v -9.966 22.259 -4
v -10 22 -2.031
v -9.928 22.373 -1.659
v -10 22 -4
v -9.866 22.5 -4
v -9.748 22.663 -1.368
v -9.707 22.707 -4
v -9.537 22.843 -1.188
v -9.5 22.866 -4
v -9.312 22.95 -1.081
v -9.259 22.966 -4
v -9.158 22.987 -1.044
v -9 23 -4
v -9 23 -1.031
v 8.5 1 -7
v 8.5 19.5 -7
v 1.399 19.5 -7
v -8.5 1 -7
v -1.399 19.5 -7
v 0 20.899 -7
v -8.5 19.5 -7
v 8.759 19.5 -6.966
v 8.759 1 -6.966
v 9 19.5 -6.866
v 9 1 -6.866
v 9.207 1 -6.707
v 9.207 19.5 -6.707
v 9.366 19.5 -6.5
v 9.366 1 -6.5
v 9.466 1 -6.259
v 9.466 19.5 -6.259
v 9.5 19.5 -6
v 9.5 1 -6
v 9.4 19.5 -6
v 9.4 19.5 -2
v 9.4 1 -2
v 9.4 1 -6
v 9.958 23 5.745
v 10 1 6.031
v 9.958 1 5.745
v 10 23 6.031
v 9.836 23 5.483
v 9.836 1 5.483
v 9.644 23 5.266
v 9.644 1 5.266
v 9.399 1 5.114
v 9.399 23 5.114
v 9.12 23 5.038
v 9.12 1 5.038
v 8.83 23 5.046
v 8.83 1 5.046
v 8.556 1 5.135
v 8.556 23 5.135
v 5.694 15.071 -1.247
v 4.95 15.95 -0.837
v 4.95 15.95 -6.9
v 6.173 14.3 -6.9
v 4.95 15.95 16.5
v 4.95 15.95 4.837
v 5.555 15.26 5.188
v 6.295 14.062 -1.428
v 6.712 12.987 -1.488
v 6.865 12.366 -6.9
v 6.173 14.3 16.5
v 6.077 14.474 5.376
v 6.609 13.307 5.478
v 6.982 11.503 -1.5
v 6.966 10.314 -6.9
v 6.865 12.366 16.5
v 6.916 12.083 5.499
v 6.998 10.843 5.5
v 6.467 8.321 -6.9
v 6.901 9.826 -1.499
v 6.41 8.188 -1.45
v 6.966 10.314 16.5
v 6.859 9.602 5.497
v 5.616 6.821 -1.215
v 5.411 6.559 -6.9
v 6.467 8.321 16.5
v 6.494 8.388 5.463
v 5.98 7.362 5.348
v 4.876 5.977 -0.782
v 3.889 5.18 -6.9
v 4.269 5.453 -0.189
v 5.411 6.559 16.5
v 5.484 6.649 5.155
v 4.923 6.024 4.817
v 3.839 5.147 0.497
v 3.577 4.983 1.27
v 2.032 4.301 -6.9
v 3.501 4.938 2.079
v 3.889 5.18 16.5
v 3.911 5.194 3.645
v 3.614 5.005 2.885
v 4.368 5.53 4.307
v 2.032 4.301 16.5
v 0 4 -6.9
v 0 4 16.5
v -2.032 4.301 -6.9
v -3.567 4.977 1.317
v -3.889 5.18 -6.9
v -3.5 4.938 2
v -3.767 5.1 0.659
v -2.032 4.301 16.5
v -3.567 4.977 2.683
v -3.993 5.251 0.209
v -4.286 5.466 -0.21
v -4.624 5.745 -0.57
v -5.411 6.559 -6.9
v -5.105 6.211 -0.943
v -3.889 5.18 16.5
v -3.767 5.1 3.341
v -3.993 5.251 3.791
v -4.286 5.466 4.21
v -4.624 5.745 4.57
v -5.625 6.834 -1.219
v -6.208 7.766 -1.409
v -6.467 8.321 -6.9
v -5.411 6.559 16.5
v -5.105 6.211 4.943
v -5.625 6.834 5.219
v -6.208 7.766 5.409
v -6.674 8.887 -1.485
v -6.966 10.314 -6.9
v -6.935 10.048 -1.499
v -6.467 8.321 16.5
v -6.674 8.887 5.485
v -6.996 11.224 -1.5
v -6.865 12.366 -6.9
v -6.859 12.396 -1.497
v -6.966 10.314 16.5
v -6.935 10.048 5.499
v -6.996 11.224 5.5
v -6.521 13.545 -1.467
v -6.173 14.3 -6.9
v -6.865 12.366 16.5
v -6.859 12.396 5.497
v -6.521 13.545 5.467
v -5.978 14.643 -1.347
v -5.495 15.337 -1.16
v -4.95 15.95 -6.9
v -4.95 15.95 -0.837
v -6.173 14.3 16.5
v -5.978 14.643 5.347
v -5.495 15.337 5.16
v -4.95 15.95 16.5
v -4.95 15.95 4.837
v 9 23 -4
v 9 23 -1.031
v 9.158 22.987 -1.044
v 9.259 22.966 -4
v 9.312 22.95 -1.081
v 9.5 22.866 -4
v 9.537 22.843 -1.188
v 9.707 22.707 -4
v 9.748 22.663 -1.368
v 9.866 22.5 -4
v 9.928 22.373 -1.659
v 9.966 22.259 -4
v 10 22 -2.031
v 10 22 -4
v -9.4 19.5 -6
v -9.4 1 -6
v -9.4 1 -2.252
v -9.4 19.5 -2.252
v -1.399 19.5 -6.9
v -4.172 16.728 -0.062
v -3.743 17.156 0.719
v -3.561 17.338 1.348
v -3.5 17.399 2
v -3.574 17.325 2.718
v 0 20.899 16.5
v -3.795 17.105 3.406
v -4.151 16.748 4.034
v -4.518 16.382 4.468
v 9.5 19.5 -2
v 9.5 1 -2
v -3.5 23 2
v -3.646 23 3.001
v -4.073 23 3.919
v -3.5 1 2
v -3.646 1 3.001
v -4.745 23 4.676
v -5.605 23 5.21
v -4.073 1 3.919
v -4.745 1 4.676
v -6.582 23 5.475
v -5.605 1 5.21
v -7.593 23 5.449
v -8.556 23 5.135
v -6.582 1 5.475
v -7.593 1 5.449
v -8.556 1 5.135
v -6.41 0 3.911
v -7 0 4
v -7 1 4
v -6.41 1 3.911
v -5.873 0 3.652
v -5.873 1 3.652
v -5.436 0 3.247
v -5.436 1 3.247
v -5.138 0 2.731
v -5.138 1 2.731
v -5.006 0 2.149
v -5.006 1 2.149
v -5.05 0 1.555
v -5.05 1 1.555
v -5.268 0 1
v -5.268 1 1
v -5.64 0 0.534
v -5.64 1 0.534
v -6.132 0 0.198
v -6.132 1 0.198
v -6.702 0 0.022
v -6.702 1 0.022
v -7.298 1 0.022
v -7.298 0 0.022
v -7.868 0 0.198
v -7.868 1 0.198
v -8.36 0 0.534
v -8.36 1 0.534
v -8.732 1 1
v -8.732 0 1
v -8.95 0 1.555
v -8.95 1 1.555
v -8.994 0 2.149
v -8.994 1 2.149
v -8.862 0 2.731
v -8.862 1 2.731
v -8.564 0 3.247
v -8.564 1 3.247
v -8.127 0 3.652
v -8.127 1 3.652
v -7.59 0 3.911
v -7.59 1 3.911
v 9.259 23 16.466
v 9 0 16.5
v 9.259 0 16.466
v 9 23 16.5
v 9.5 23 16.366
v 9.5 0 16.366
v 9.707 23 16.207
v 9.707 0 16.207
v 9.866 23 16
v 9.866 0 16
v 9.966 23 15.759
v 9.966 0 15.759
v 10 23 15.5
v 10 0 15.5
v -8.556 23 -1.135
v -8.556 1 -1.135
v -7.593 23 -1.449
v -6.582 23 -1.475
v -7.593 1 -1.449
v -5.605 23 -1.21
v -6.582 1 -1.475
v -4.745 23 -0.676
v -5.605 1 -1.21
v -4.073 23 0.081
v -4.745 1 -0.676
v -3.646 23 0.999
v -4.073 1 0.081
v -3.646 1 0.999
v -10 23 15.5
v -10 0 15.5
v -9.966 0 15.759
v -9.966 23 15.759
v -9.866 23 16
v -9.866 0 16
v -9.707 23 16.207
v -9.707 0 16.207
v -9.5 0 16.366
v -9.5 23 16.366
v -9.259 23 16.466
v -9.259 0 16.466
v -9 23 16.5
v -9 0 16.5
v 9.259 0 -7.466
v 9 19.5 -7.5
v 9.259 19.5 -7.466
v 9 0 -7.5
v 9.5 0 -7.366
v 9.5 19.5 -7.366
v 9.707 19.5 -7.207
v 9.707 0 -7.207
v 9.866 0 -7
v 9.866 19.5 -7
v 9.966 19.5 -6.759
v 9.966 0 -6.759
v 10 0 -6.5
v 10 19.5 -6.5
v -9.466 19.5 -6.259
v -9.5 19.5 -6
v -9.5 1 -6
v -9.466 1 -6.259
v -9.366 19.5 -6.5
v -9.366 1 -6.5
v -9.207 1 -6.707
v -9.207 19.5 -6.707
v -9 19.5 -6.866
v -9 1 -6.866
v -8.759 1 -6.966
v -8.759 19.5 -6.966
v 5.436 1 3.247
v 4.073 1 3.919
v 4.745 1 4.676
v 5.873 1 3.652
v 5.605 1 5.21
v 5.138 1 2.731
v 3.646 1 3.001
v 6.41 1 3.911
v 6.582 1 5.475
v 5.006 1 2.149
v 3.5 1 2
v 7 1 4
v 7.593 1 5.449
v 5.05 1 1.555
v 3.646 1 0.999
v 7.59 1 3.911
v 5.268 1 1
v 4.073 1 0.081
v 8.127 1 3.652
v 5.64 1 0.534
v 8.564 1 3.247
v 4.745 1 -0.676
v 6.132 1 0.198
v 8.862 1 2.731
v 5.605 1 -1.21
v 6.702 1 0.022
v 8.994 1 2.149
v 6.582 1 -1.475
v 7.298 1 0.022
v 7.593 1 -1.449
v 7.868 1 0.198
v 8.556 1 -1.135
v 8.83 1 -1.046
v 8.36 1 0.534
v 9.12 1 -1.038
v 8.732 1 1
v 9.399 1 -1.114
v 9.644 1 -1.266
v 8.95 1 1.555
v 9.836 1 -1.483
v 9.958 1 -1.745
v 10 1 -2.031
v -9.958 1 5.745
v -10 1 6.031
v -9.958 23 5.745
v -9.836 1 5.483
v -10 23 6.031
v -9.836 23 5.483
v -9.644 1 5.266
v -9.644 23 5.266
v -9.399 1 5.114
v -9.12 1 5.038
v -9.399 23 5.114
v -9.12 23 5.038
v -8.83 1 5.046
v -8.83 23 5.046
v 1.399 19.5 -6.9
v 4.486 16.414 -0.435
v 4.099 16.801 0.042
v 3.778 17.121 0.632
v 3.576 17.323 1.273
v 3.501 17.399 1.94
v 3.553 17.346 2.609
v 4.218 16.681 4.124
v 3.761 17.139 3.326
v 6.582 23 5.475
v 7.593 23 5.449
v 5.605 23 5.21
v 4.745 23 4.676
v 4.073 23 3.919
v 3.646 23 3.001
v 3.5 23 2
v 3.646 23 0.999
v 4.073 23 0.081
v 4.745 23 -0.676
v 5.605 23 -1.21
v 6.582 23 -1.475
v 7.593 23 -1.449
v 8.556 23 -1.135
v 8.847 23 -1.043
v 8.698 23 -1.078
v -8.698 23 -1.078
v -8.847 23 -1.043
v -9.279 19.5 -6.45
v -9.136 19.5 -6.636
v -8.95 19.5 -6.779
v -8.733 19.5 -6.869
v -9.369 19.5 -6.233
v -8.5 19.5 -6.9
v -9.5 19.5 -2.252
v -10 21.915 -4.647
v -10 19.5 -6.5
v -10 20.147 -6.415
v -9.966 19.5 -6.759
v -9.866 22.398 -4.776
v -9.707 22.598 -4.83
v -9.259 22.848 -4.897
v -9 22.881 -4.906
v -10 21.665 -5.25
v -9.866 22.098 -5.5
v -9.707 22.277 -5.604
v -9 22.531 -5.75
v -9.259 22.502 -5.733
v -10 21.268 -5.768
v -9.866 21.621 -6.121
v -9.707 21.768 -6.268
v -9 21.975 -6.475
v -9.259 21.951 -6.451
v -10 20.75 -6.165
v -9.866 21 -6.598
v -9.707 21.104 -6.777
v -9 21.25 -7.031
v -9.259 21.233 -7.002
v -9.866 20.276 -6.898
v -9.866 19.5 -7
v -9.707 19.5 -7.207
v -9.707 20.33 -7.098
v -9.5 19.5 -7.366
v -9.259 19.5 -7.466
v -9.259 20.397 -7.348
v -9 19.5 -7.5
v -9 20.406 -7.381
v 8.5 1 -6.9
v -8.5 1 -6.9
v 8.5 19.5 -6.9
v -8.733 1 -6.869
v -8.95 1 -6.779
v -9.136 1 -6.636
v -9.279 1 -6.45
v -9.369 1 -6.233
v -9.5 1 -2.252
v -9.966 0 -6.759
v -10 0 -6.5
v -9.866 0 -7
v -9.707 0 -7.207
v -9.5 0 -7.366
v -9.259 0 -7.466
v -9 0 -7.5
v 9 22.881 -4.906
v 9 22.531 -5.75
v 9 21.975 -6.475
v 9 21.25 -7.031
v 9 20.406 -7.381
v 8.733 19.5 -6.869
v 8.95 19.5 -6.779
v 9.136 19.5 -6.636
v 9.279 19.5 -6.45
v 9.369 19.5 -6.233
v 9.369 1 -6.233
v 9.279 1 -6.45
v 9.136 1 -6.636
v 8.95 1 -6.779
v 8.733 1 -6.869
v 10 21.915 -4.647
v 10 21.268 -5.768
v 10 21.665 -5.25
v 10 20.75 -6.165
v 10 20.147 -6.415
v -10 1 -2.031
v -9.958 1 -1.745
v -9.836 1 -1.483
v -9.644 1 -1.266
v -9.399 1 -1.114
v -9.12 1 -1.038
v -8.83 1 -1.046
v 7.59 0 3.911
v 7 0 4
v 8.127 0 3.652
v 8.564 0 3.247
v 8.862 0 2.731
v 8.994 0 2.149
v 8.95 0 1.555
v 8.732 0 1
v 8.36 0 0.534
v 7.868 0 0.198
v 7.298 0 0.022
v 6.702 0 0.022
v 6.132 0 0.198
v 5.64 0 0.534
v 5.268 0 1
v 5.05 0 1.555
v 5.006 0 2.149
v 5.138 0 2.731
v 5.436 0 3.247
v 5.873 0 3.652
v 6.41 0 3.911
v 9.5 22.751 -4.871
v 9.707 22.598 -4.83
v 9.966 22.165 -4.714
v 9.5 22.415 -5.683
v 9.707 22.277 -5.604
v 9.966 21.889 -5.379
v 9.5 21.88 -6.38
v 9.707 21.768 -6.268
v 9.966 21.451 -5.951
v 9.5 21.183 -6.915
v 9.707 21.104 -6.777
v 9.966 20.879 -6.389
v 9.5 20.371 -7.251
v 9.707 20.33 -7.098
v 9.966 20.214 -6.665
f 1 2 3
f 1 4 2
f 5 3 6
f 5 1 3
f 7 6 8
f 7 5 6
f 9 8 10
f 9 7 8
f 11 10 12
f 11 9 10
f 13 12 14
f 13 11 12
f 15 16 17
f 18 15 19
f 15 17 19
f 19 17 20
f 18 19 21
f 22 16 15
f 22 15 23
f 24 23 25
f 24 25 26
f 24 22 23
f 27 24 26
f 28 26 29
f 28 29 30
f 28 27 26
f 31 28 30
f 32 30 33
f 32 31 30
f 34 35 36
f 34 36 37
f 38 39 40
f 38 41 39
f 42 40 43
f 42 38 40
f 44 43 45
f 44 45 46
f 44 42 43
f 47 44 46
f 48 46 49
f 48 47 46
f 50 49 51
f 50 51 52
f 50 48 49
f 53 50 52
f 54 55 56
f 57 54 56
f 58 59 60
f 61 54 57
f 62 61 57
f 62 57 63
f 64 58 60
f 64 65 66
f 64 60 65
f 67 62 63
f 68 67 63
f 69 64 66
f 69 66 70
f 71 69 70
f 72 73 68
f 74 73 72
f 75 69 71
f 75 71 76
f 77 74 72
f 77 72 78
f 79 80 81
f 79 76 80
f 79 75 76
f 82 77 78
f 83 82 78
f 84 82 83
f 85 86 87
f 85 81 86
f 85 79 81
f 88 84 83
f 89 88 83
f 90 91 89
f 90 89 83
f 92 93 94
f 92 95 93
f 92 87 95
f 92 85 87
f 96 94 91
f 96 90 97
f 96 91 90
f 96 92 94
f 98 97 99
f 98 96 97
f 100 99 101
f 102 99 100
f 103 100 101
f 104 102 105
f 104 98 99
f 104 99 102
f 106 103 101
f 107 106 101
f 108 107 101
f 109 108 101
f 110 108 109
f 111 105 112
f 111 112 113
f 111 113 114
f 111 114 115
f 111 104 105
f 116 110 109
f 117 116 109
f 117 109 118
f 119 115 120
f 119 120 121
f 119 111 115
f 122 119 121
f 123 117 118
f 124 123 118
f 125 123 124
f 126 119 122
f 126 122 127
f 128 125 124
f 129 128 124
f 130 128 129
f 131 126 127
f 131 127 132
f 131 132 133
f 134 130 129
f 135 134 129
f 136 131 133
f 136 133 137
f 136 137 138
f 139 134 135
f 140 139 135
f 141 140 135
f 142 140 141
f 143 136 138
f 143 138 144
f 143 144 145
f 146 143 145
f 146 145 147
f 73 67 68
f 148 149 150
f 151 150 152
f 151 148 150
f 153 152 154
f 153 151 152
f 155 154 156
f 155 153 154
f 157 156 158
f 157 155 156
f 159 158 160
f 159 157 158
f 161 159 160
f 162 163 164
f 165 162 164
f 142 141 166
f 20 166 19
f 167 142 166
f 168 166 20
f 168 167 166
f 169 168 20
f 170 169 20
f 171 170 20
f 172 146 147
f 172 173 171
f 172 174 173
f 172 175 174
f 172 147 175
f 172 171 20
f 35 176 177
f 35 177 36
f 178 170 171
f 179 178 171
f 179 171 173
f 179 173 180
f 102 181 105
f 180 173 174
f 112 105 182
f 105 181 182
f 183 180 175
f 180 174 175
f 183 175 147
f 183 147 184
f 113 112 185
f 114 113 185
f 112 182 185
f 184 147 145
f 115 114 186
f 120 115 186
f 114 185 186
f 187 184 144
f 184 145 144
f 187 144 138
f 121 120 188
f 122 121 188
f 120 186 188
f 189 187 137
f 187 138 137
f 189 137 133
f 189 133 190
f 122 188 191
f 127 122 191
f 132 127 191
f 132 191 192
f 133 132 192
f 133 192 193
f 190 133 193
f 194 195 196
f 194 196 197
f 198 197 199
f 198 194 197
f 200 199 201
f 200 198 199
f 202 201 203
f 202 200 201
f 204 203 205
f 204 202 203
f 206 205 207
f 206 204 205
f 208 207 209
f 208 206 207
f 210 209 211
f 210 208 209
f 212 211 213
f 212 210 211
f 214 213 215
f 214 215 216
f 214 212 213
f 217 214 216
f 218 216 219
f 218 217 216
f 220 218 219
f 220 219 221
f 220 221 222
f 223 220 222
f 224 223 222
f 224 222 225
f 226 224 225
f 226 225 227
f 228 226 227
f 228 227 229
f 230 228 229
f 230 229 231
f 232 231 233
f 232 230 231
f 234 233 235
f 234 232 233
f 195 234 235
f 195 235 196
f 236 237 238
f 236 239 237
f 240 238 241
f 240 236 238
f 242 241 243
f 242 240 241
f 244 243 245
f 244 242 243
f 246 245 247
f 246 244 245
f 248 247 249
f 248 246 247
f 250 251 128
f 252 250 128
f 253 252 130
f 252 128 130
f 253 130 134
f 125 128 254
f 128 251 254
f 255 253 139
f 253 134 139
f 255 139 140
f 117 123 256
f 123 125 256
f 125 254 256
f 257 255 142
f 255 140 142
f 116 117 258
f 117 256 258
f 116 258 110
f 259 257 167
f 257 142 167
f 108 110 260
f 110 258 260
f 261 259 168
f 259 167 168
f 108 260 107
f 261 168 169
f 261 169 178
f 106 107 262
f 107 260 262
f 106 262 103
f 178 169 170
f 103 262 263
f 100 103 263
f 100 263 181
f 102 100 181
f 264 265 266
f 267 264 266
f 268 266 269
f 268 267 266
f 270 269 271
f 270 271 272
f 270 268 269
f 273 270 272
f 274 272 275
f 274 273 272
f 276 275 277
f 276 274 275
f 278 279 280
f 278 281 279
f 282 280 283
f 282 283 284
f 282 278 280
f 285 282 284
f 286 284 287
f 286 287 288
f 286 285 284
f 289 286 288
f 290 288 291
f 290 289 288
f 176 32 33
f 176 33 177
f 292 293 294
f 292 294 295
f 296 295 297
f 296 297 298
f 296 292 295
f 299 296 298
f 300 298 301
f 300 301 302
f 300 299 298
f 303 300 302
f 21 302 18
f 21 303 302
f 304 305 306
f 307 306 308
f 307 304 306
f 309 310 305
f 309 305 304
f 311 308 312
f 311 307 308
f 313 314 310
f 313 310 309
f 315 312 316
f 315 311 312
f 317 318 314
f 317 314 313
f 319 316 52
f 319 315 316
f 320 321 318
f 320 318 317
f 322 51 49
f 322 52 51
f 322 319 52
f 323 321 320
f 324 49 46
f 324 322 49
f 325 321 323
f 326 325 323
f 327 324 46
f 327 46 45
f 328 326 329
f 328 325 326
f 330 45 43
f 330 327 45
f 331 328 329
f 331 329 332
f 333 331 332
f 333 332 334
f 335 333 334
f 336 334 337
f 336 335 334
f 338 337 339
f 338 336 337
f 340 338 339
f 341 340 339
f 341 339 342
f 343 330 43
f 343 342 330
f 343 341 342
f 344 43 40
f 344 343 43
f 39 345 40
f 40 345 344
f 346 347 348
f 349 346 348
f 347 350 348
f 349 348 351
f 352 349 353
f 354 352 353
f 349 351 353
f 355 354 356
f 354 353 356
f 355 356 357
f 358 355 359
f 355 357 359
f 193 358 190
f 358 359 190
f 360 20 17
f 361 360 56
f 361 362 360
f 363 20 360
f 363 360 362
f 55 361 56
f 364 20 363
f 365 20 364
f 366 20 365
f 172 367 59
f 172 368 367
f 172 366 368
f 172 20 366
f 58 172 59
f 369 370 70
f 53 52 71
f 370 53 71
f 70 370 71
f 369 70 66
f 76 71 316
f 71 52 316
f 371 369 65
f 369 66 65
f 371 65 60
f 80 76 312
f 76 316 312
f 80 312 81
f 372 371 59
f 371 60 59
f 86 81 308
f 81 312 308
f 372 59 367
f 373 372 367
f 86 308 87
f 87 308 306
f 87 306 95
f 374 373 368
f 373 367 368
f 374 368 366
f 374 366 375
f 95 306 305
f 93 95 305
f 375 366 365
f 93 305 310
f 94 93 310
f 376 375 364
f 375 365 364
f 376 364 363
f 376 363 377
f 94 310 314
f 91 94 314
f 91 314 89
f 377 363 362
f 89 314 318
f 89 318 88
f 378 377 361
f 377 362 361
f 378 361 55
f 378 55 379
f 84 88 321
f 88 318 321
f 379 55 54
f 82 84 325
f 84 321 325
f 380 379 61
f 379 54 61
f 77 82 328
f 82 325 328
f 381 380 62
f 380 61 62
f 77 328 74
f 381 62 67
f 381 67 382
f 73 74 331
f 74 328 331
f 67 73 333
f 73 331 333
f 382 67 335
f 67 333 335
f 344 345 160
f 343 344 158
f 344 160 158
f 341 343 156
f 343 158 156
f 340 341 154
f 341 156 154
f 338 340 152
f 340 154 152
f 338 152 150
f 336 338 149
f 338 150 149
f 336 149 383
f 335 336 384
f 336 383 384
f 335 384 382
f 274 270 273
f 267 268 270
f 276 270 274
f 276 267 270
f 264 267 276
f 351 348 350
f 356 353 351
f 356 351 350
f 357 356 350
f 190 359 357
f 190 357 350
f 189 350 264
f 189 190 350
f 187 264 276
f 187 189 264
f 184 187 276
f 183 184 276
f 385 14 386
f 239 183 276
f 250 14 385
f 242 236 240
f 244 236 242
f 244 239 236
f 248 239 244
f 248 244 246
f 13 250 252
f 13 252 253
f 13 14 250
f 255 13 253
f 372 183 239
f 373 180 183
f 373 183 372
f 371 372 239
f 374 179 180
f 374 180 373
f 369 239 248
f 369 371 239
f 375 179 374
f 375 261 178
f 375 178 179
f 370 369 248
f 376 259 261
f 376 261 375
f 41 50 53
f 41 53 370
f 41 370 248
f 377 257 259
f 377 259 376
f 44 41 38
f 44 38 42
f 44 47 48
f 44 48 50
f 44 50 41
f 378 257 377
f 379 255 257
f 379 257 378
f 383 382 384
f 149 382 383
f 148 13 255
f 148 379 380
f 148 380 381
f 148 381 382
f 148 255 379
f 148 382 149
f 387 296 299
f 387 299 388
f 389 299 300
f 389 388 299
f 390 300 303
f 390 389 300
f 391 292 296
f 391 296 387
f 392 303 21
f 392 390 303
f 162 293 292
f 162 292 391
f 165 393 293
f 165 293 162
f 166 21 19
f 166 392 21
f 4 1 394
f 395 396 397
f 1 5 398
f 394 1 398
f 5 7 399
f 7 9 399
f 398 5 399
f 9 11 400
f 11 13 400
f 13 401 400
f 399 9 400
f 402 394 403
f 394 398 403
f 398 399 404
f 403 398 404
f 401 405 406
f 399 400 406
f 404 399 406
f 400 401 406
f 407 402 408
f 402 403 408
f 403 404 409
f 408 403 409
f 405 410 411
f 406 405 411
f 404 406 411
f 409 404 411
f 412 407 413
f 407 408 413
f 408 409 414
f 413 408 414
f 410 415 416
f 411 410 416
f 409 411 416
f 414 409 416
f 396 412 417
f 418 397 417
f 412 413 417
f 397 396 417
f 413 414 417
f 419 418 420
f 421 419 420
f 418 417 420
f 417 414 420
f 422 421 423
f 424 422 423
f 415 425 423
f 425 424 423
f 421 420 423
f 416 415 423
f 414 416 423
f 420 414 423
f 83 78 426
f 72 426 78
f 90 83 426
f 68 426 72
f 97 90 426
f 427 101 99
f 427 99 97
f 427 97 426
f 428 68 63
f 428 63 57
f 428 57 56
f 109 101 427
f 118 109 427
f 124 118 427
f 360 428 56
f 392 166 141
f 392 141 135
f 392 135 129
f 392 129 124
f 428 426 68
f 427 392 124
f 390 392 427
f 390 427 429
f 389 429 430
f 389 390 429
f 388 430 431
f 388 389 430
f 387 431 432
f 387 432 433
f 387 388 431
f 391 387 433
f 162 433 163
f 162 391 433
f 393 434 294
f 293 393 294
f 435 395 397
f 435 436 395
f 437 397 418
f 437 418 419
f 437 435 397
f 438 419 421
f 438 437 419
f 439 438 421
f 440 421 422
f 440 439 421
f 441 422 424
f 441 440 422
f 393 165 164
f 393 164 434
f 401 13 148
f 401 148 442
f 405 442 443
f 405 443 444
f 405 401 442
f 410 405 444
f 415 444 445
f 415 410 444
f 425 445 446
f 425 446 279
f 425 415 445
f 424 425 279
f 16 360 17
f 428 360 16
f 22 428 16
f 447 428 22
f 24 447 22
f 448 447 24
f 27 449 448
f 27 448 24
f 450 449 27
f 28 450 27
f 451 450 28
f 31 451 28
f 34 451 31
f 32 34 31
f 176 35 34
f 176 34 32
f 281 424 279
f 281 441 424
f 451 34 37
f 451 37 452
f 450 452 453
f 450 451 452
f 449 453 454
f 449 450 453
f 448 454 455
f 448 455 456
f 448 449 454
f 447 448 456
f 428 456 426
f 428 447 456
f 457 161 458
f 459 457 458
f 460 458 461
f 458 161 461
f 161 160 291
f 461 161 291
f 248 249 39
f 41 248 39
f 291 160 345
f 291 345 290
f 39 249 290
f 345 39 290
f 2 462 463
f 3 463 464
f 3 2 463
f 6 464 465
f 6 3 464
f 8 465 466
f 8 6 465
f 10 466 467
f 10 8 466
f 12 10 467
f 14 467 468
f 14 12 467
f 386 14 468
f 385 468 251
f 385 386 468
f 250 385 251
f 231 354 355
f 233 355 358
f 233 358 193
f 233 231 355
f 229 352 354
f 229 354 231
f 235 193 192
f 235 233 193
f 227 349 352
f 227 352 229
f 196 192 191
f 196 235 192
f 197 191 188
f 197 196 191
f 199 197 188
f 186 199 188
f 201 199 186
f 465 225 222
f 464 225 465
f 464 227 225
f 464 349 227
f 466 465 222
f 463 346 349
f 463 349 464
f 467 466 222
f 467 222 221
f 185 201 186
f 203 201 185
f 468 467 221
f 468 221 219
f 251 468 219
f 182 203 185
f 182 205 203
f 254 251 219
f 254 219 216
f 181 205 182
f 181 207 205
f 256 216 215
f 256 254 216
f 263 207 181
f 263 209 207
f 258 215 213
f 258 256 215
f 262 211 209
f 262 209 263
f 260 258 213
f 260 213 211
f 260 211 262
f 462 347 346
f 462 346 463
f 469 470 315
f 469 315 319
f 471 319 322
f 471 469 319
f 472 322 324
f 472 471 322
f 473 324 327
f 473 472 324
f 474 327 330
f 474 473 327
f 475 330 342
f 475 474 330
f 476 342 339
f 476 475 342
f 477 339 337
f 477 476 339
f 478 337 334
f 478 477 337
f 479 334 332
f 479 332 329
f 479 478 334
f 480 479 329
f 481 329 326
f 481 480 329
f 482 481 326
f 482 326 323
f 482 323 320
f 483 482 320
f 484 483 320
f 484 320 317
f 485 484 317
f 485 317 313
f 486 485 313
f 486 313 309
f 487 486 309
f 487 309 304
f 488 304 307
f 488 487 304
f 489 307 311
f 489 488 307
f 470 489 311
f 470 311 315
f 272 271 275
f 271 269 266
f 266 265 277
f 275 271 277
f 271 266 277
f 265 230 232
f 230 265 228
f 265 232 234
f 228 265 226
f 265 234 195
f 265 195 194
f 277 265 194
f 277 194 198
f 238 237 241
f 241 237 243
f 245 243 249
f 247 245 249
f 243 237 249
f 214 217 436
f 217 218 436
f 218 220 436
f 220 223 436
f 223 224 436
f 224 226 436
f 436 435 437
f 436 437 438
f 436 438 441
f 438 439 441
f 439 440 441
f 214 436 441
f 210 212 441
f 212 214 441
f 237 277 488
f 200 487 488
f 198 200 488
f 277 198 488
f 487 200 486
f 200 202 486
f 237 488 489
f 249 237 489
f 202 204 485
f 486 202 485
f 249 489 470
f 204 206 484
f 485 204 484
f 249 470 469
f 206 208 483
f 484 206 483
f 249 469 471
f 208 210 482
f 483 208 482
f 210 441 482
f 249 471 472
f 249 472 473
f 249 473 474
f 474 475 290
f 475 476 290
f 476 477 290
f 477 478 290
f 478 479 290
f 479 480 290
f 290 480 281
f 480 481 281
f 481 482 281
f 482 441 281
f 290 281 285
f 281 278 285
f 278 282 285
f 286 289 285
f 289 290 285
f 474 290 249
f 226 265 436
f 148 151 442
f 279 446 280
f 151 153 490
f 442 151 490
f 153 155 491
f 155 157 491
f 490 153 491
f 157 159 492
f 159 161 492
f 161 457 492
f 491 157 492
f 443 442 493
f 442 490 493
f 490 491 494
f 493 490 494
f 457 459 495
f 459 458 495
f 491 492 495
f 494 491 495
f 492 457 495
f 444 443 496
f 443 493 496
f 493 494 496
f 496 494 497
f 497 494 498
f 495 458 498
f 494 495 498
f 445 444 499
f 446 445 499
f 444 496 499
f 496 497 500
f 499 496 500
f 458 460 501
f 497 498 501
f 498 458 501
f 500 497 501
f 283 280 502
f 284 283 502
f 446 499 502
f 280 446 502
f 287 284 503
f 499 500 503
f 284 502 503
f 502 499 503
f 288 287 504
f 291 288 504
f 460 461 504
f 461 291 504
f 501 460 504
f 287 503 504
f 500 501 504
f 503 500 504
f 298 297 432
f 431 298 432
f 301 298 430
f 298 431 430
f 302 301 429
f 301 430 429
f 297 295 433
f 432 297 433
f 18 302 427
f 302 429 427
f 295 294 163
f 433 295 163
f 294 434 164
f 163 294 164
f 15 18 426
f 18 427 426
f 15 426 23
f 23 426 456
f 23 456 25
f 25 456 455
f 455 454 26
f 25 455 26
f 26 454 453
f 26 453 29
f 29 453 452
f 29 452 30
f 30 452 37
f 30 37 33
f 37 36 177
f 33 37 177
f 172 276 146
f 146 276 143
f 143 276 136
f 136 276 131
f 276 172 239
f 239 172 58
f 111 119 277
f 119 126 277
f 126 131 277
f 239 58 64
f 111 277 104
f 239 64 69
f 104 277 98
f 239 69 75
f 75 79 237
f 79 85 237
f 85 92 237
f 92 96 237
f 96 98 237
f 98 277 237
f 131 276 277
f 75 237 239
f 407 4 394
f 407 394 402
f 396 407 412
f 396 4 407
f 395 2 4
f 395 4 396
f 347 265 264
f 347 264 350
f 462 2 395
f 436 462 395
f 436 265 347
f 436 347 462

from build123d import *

# Parameters (mm, degrees)
SKETCH1_W           = 20
SKETCH1_H           = 24
SKETCH1_R           = 2
BOSS_EXTRUDE2_DEPTH = 1
BOSS_EXTRUDE3_DEPTH = 23
SKETCH1_5_R         = 2
BOSS_EXTRUDE4_DEPTH = 5
CUT_EXTRUDE1_DEPTH  = 23.5
FILLET2_R           = 3.5
FILLET1_R           = 1
CUT_EXTRUDE3_START  = -19.5
CUT_EXTRUDE3_DEPTH  = 18.5


with BuildPart() as part:
    # Sketch1 → Boss-Extrude2 (new body)
    with BuildSketch(Plane(origin=(0, 0, 0), x_dir=(1, 0, 0), z_dir=(0, 1, 0))):
        with Locations((0, -4.5)):
            Rectangle(SKETCH1_W, SKETCH1_H)
        with Locations(Location((-7, -2, 0), (0, 0, 270))):
            Circle(SKETCH1_R, mode=Mode.SUBTRACT)
        with Locations(Location((7, -2, 0), (0, 0, 270))):
            Circle(SKETCH1_R, mode=Mode.SUBTRACT)
    extrude(amount=BOSS_EXTRUDE2_DEPTH)

    # Sketch1<4> → Boss-Extrude3 (add)
    with BuildSketch(Plane(origin=(0, 0, 0), x_dir=(1, 0, 0), z_dir=(0, 1, 0))):
        with BuildLine():
            Line((10, 7.5), (-10, 7.5))
            Line((-10, 7.5), (-10, -0.197224362))
            ThreePointArc((-10, -0.197224362), (-6.064585653, 1.372684391), (-3.5, -2))
            ThreePointArc((-3.5, -2), (-6.064585653, -5.372684391), (-10, -3.802775638))
            Line((-10, -3.802775638), (-10, -16.5))
            Line((-10, -16.5), (10, -16.5))
            Line((10, -16.5), (10, -3.802775638))
            ThreePointArc((10, -3.802775638), (3.5, -2), (10, -0.197224362))
            Line((10, -0.197224362), (10, 7.5))
        make_face()
    extrude(amount=BOSS_EXTRUDE3_DEPTH)

    # Sketch2 → Cut-Extrude1 (cut)
    with BuildSketch(Plane.XY.offset(16.5)):
        with BuildLine():
            Line((-4.949747468, 15.949747468), (0, 20.899494937))
            Line((0, 20.899494937), (4.949747468, 15.949747468))
            ThreePointArc((4.949747468, 15.949747468), (0, 4), (-4.949747468, 15.949747468))
        make_face()
    extrude(amount=-CUT_EXTRUDE1_DEPTH, mode=Mode.SUBTRACT)

    # Fillet2
    fillet2_edges = [part.edges().sort_by_distance(p)[0] for p in [
        (0, 23, -7.5),
    ]]
    fillet(fillet2_edges, radius=FILLET2_R)

    # Fillet1
    fillet1_edges = [part.edges().sort_by_distance(p)[0] for p in [
        (10, 12, 3.802775638),
        (10, 12, 0.197224362),
        (-10, 12, 3.802775638),
        (-10, 12, 0.197224362),
        (-10, 11.5, 16.5),
        (10, 11.5, 16.5),
        (10, 9.75, -7.5),
        (-10, 9.75, -7.5),
        (10, 23, -1.901387819),
        (10, 21.974873734, -6.474873734),
        (-10, 23, -1.901387819),
        (-10, 21.974873734, -6.474873734),
    ]]
    fillet(fillet1_edges, radius=FILLET1_R)

    # Sketch4 → Cut-Extrude3 (cut)
    with BuildSketch(Plane.XZ.offset(CUT_EXTRUDE3_START)):
        with BuildLine():
            Line((-9.5, -2.251571667), (-9.5, -6))
            ThreePointArc((-9.5, -6), (-9.207106781, -6.707106781), (-8.5, -7))
            Line((-8.5, -7), (8.5, -7))
            ThreePointArc((8.5, -7), (9.207106781, -6.707106781), (9.5, -6))
            Line((9.5, -6), (9.5, -2))
            Line((9.5, -2), (9.4, -2))
            Line((9.4, -2), (9.4, -6))
            ThreePointArc((9.4, -6), (9.136396103, -6.636396103), (8.5, -6.9))
            Line((8.5, -6.9), (-8.5, -6.9))
            ThreePointArc((-8.5, -6.9), (-9.136396103, -6.636396103), (-9.4, -6))
            Line((-9.4, -6), (-9.4, -2.251571667))
            Line((-9.4, -2.251571667), (-9.5, -2.251571667))
        make_face()
    extrude(amount=CUT_EXTRUDE3_DEPTH, mode=Mode.SUBTRACT)


with BuildPart() as body_2:
    # Sketch1<5> → Boss-Extrude4 (new body)
    # profile 1 of 2: a face of its own
    with BuildSketch(Plane(origin=(0, 0, 0), x_dir=(1, 0, 0), z_dir=(0, 1, 0))):
        with BuildLine():
            ThreePointArc((-3.5, -2), (-6.064585653, 1.372684391), (-10, -0.197224362))
            Line((-10, -0.197224362), (-10, -3.802775638))
            ThreePointArc((-10, -3.802775638), (-6.064585653, -5.372684391), (-3.5, -2))
        make_face()
        with Locations(Location((-7, -2, 0), (0, 0, 270))):
            Circle(SKETCH1_5_R, mode=Mode.SUBTRACT)
    # profile 2 of 2: a face of its own
    with BuildSketch(Plane(origin=(0, 0, 0), x_dir=(1, 0, 0), z_dir=(0, 1, 0))):
        with Locations(Location((-7, -2, 0), (0, 0, 270))):
            Circle(SKETCH1_5_R)
    extrude(amount=BOSS_EXTRUDE4_DEPTH)


solid = part.part
